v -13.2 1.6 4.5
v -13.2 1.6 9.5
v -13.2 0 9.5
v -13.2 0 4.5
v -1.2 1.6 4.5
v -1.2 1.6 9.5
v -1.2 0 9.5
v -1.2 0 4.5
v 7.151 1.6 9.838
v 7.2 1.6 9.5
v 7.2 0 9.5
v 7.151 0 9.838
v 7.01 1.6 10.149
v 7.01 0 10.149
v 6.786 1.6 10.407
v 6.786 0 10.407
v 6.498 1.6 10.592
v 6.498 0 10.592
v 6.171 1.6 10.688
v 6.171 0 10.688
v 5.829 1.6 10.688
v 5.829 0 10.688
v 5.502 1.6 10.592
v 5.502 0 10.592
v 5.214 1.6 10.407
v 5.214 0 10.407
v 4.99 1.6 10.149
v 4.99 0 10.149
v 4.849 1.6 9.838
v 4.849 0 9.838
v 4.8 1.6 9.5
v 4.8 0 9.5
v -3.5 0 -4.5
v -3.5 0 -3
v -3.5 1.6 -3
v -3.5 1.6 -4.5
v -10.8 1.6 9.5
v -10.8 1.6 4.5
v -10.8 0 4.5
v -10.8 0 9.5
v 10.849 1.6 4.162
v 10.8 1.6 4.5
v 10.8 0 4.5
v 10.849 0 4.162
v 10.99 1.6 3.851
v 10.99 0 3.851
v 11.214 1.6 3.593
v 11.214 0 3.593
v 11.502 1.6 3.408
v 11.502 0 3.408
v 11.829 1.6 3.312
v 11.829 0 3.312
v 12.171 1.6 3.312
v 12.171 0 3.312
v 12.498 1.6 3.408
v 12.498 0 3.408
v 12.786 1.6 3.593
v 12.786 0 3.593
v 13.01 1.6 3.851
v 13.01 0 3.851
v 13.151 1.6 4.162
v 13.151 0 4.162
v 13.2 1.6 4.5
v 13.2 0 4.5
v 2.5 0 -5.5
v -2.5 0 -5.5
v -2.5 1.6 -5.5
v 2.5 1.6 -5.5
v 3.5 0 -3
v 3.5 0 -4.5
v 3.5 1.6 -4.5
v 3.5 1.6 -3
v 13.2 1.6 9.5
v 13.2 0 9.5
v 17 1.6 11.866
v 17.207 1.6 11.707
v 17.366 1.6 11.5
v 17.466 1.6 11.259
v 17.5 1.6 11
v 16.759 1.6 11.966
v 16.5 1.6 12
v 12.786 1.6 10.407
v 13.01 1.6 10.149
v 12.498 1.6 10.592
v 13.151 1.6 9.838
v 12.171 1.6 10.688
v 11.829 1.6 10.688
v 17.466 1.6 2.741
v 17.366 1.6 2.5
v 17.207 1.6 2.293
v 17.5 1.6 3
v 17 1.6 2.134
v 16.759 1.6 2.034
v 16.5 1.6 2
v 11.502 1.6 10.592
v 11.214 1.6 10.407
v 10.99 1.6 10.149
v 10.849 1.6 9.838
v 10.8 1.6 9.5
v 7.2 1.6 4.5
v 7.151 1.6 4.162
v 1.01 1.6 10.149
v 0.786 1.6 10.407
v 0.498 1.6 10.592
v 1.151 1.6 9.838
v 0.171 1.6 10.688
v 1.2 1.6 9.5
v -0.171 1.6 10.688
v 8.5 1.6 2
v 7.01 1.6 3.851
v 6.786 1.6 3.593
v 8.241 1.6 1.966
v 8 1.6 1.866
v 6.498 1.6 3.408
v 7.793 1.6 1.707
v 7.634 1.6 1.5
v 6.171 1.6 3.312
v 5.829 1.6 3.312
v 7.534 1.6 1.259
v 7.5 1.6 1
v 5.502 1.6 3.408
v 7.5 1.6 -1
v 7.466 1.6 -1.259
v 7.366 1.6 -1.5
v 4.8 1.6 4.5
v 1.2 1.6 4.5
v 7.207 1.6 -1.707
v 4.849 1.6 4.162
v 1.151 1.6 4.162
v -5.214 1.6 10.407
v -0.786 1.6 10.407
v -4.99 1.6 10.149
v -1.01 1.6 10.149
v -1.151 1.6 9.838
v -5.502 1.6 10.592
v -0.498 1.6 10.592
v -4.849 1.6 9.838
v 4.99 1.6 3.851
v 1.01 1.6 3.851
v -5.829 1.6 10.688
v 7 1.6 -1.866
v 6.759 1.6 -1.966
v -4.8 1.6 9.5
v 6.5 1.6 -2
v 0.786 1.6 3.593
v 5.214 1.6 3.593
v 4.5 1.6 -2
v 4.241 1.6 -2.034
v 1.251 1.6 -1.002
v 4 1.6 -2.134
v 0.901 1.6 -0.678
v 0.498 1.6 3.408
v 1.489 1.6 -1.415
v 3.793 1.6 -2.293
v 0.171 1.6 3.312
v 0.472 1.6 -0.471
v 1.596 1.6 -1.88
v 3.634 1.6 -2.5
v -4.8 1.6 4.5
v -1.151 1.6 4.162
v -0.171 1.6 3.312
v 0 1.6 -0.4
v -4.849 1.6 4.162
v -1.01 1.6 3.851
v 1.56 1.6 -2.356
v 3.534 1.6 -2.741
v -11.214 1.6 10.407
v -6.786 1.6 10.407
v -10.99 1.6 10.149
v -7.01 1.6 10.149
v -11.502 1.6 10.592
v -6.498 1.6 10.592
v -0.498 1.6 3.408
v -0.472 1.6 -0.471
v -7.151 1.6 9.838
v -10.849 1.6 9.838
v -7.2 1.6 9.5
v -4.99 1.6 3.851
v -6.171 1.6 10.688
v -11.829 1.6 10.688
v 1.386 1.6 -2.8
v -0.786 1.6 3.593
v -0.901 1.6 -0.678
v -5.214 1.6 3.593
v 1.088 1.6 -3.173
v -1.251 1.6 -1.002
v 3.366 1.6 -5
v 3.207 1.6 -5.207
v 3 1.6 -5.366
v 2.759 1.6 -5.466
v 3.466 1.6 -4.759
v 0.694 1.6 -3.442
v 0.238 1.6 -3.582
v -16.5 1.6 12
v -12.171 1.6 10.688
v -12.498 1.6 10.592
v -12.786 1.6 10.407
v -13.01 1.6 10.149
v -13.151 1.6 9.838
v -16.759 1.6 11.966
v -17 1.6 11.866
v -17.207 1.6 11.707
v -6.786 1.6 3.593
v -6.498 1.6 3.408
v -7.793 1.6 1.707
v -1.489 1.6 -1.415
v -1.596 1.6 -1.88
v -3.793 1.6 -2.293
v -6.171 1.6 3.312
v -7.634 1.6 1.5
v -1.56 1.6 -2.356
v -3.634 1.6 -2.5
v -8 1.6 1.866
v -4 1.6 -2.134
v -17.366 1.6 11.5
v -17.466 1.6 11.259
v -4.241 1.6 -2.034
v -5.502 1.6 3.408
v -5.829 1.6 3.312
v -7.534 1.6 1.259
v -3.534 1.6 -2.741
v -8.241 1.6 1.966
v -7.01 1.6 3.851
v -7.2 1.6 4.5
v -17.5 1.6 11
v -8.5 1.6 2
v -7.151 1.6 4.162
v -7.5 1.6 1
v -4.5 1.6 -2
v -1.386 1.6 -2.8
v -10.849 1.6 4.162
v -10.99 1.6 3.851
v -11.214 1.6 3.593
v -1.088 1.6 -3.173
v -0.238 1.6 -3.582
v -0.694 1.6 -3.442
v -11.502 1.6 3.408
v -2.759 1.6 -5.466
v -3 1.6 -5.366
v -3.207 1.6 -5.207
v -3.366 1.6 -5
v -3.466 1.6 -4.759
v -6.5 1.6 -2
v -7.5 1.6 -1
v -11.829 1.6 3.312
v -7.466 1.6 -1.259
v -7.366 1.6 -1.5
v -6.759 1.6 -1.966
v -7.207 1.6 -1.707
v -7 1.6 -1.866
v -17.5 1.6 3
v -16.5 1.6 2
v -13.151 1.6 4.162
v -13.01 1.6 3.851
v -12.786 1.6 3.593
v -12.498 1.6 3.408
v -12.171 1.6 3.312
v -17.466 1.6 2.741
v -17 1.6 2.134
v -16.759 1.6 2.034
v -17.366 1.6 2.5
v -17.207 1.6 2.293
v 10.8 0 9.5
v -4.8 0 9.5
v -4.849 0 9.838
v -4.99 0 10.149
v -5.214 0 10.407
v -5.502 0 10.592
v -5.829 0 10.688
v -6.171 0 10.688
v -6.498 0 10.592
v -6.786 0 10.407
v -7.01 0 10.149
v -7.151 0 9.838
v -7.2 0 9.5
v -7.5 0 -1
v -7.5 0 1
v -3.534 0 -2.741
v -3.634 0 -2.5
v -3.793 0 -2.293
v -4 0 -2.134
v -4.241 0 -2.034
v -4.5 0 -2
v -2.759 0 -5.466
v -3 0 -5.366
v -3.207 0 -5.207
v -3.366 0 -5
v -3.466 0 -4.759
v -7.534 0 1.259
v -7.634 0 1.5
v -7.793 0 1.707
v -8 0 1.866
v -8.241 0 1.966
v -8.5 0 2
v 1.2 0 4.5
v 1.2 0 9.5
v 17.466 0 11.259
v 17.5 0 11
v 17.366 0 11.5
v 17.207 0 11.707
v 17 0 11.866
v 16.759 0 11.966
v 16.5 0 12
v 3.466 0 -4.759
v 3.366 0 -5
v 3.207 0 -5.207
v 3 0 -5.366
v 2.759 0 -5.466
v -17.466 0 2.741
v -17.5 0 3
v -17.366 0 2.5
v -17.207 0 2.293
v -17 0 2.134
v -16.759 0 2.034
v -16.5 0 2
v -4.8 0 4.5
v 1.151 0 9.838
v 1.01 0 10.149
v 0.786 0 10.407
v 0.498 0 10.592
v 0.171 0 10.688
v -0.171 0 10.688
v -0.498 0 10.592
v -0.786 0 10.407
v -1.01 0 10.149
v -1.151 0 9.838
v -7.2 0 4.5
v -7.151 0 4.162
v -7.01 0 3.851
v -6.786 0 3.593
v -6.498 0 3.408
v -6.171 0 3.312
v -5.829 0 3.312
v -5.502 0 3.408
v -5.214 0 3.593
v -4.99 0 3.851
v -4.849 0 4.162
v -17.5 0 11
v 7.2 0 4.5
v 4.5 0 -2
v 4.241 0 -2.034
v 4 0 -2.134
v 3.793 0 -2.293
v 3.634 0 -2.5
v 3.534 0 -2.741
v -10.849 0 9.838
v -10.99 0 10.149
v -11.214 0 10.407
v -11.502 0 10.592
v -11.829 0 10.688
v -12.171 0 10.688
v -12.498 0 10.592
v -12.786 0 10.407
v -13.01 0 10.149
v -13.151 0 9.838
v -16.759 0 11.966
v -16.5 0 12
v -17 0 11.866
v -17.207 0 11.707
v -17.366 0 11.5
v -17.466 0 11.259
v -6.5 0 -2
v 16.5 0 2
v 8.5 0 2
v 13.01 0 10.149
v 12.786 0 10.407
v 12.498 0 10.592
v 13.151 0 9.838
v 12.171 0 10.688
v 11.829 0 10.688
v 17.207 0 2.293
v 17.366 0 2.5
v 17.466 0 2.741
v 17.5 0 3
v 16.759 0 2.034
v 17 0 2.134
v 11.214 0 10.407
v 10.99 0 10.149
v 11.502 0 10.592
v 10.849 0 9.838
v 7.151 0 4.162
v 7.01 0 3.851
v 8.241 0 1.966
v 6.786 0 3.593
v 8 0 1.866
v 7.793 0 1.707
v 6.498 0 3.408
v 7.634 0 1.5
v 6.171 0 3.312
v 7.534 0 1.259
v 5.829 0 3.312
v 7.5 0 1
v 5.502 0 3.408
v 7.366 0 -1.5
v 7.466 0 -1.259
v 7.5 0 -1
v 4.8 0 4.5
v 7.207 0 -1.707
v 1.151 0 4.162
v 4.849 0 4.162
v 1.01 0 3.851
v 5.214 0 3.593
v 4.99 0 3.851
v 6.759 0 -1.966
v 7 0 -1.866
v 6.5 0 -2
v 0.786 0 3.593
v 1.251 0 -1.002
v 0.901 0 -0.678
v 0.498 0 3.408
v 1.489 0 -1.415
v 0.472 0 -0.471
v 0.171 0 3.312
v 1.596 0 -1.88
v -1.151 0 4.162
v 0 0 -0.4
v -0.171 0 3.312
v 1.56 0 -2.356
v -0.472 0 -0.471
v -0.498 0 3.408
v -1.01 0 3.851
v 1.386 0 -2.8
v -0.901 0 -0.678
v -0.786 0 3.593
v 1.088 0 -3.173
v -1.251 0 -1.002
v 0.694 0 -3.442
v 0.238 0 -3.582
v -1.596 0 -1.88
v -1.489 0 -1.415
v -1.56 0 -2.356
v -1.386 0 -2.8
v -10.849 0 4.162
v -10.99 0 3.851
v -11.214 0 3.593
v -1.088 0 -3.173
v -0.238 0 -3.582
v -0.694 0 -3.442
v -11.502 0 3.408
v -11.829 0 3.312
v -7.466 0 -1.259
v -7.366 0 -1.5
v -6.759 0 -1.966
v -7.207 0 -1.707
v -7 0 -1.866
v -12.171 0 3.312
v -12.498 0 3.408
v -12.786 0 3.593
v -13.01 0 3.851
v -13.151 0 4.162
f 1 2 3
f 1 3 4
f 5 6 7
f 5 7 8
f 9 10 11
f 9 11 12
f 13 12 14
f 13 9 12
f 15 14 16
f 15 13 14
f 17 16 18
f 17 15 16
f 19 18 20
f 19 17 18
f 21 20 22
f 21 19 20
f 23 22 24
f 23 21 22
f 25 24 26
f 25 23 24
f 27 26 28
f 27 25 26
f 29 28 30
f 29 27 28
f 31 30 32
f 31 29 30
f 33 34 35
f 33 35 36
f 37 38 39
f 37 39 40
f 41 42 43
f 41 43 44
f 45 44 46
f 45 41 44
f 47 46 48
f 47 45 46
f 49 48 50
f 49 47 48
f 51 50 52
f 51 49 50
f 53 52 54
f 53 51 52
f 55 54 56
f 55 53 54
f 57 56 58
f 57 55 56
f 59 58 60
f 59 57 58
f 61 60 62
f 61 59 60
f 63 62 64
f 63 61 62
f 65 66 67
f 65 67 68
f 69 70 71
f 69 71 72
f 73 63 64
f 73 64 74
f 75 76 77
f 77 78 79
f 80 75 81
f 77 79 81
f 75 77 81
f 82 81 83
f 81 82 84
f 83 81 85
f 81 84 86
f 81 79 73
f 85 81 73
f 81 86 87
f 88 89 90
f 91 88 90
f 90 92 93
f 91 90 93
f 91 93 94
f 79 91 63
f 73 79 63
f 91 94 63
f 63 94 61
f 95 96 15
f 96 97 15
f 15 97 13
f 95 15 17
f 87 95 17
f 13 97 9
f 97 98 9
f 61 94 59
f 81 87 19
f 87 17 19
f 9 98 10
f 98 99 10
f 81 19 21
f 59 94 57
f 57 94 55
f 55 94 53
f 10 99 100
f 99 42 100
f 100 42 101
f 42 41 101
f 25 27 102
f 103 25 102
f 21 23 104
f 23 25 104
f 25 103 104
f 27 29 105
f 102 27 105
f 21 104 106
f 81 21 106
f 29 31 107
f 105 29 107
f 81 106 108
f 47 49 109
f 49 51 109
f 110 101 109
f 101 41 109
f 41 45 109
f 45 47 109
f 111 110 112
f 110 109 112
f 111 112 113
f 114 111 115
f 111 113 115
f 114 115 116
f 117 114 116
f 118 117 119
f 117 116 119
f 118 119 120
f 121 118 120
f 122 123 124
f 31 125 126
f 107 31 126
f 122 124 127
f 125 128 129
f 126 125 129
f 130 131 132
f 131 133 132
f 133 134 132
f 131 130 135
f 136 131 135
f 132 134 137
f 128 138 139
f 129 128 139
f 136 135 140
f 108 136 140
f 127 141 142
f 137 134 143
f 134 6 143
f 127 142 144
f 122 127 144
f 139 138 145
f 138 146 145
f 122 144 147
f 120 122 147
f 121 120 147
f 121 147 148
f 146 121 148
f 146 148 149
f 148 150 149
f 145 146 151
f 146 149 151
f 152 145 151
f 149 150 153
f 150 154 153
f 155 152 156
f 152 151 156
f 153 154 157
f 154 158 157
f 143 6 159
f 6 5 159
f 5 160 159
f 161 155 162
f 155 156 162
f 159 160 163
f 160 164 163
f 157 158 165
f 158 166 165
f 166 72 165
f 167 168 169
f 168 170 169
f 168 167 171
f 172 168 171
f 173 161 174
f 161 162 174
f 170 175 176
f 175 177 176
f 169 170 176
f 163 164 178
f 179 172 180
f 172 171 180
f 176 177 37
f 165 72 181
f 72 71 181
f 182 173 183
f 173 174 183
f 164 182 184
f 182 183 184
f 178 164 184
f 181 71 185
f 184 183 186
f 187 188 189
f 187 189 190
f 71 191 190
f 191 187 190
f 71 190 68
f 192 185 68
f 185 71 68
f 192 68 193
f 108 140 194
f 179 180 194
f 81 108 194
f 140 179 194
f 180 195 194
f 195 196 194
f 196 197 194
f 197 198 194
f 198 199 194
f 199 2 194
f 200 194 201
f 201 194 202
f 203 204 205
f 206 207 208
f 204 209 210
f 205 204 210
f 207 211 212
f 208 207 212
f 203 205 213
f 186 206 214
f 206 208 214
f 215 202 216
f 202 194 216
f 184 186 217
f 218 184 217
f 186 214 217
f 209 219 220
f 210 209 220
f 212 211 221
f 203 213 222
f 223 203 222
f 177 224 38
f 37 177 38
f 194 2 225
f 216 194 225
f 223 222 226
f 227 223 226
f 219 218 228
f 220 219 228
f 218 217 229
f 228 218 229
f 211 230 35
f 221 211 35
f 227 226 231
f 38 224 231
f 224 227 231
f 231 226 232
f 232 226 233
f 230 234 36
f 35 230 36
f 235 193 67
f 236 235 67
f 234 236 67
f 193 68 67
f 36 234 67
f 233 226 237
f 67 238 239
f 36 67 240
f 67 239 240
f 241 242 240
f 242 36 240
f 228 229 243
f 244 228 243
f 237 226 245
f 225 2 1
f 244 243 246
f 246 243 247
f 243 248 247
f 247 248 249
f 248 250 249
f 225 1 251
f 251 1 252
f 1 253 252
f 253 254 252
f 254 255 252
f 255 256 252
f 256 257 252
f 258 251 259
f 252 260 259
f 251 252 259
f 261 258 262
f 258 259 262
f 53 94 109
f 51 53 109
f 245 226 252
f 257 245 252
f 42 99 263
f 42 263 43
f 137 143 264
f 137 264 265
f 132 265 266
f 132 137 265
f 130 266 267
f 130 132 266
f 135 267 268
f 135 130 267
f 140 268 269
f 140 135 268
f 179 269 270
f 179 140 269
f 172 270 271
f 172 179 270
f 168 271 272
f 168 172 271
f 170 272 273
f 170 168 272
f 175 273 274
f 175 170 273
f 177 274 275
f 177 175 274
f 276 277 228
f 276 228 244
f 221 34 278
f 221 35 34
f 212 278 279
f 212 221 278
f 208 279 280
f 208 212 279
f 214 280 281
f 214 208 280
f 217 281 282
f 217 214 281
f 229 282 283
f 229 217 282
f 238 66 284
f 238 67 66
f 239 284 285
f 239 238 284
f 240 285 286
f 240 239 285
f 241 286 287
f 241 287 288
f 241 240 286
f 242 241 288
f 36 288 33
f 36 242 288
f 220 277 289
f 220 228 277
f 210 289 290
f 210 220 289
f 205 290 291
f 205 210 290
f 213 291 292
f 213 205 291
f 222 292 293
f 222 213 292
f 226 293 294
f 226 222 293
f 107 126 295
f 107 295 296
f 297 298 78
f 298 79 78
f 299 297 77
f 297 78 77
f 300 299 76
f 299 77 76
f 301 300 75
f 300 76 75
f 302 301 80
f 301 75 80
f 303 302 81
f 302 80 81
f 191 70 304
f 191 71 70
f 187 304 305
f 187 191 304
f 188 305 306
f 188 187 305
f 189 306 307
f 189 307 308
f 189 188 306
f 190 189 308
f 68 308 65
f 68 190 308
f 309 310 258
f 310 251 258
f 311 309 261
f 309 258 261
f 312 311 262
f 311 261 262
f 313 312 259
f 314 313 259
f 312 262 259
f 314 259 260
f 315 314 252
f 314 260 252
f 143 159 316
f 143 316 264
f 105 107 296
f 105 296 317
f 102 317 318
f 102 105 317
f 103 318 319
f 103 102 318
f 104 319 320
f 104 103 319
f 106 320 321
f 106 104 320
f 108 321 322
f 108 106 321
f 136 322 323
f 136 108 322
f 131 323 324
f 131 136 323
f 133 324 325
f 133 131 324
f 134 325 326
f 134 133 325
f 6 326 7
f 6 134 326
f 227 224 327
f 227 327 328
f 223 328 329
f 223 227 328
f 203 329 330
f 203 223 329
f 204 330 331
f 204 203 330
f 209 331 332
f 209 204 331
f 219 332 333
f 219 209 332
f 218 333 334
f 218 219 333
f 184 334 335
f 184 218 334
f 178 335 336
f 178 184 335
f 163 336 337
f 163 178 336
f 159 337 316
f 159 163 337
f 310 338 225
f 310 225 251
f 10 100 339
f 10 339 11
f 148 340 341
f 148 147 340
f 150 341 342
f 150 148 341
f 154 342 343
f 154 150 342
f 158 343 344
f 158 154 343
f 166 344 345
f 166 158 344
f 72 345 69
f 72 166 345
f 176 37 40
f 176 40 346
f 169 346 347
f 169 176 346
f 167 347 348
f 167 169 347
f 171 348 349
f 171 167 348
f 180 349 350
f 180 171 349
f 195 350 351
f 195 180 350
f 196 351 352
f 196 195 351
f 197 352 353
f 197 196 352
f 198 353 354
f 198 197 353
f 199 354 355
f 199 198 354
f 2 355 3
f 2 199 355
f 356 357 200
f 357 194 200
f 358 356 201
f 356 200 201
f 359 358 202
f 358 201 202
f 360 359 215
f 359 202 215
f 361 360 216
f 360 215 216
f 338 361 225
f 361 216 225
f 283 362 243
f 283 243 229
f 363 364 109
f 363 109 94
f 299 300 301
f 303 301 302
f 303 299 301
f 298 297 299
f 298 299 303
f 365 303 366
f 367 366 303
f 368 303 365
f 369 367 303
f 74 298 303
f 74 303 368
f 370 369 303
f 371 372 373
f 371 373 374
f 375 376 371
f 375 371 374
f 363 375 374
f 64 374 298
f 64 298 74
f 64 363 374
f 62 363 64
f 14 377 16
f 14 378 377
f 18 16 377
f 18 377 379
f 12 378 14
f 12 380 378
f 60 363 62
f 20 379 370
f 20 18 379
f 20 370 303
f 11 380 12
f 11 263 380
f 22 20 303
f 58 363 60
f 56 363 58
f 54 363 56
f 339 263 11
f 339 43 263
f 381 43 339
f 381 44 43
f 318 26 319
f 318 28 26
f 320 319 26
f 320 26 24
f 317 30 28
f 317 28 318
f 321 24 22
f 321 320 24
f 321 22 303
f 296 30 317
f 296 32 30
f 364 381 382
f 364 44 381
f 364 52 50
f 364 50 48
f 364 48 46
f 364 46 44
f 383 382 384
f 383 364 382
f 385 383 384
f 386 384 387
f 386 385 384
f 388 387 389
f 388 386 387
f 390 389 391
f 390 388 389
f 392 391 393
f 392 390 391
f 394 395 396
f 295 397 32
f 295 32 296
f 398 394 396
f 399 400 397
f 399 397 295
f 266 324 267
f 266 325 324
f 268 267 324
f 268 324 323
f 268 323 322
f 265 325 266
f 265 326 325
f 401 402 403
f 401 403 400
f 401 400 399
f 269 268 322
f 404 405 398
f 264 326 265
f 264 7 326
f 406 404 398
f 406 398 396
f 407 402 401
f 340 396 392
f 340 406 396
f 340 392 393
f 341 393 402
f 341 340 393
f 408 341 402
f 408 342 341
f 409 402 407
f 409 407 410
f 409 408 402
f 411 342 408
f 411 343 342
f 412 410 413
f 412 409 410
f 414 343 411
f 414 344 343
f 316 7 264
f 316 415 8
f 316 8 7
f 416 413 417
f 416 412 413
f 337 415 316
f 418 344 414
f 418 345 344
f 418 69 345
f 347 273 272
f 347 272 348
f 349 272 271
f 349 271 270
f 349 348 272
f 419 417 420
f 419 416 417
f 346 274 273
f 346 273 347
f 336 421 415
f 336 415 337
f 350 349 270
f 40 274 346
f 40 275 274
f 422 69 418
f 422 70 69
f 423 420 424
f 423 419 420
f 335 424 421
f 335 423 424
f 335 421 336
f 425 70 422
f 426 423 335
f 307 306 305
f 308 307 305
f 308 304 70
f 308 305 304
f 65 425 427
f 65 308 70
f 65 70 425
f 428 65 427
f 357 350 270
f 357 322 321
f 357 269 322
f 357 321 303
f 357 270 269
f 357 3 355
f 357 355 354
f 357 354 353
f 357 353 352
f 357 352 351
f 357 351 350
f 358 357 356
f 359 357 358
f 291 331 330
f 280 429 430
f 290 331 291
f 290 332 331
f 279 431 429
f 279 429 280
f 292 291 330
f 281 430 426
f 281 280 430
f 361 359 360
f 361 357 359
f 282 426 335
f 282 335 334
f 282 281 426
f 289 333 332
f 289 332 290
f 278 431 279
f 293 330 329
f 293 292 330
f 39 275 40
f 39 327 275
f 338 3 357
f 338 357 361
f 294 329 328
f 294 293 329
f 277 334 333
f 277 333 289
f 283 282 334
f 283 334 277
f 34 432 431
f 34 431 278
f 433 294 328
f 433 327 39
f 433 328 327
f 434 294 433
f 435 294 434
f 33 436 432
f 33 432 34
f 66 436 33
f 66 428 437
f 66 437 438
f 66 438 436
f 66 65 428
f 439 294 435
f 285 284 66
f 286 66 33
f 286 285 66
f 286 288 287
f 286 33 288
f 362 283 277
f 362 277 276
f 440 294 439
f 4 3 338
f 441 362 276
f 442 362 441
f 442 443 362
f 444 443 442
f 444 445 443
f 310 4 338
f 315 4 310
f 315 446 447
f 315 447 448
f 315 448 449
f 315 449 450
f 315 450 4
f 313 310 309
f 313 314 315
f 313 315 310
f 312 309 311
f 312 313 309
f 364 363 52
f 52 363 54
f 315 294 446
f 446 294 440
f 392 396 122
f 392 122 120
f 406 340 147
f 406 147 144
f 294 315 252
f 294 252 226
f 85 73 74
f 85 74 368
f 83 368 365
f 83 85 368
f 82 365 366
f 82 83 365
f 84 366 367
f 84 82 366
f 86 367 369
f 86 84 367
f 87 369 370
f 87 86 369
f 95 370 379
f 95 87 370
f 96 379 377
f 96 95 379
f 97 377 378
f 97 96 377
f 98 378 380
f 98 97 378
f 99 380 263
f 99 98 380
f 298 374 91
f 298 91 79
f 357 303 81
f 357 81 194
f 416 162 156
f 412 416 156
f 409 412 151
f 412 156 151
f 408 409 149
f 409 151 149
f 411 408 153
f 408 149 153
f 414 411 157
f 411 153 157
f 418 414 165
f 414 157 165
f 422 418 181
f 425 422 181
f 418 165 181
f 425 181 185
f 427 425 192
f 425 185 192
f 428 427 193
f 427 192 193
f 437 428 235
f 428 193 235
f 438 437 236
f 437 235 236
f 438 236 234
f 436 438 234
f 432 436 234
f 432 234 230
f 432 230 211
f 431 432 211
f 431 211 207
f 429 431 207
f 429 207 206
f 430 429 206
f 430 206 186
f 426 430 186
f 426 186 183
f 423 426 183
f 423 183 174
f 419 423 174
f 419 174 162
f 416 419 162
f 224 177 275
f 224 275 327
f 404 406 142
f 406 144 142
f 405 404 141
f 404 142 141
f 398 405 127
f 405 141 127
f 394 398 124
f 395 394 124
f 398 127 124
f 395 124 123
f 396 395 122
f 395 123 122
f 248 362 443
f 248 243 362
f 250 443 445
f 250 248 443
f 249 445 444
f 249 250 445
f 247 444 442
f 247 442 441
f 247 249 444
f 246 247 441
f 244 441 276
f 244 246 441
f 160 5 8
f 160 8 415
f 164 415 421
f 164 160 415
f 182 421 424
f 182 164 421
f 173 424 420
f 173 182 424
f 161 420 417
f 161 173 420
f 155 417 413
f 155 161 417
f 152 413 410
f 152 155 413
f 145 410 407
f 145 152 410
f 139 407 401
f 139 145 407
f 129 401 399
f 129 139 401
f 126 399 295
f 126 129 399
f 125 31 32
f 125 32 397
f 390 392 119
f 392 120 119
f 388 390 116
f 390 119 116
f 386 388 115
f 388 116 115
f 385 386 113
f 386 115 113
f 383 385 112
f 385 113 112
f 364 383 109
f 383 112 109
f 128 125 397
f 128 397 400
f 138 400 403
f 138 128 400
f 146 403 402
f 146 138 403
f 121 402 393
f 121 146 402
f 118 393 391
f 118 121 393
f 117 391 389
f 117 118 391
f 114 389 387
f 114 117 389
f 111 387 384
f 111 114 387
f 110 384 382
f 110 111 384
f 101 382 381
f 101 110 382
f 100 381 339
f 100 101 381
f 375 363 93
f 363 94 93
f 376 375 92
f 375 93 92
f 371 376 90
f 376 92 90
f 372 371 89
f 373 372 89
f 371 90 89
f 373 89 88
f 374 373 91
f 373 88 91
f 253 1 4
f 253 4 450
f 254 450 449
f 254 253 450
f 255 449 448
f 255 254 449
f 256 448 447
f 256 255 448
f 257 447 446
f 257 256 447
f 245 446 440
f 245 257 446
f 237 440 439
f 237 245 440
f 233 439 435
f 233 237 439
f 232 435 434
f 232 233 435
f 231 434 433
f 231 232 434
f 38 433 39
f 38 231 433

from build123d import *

# Parameters (mm, degrees)
BOSS_EXTRUDE1_DEPTH = 1.6
SKETCH2_R           = 1.6
CUT_EXTRUDE1_DEPTH  = 22.279332696
FILLET1_R           = 1
CUT_EXTRUDE2_DEPTH  = 22.279332696
LPATTERN1_COUNT     = 3
LPATTERN1_PITCH     = 6
LPATTERN1_COL_COUNT = 3
LPATTERN1_COL_PITCH = 6


with BuildPart() as part:
    # Sketch1 → Boss-Extrude1 (new body)
    with BuildSketch(Plane(origin=(0, 0, 0), x_dir=(1, 0, 0), z_dir=(0, 1, 0))):
        Polygon((3.5, 2), (7.5, 2), (7.5, -2), (17.5, -2), (17.5, -12), (-17.5, -12), (-17.5, -2), (-7.5, -2), (-7.5, 2), (-3.5, 2), (-3.5, 5.5), (3.5, 5.5), align=None)
    extrude(amount=BOSS_EXTRUDE1_DEPTH)

    # Sketch2 → Cut-Extrude1 (cut, through all)
    with BuildSketch(Plane(origin=(0, 1.6, 0), x_dir=(1, 0, 0), z_dir=(0, 1, 0))):
        with Locations(Location((0, 2, 0), (0, 0, 270))):
            Circle(SKETCH2_R)
    extrude(amount=-CUT_EXTRUDE1_DEPTH, mode=Mode.SUBTRACT)

    # Fillet1
    fillet1_edges = [part.edges().sort_by_distance(p)[0] for p in [
        (7.5, 0.8, 2),
        (17.5, 0.8, 2),
        (17.5, 0.8, 12),
        (-17.5, 0.8, 12),
        (-17.5, 0.8, 2),
        (-7.5, 0.8, 2),
        (-7.5, 0.8, -2),
        (-3.5, 0.8, -2),
        (-3.5, 0.8, -5.5),
        (3.5, 0.8, -5.5),
        (3.5, 0.8, -2),
        (7.5, 0.8, -2),
    ]]
    fillet(fillet1_edges, radius=FILLET1_R)

    # Sketch3 → Cut-Extrude2 (cut, through all)
    with BuildSketch(Plane(origin=(0, 1.6, 0), x_dir=(1, 0, 0), z_dir=(0, 1, 0))):
        with BuildLine():
            Line((-1.2, -9.5), (-1.2, -4.5))
            ThreePointArc((-1.2, -4.5), (0, -3.3), (1.2, -4.5))
            Line((1.2, -4.5), (1.2, -9.5))
            ThreePointArc((1.2, -9.5), (0, -10.7), (-1.2, -9.5))
        make_face()
    cut_extrude2 = extrude(amount=-CUT_EXTRUDE2_DEPTH, mode=Mode.SUBTRACT)

    # LPattern1: Cut-Extrude2 ×3
    with Locations(*[(i * LPATTERN1_PITCH, 0, 0) for i in range(1, LPATTERN1_COUNT)]):
        add(cut_extrude2, mode=Mode.SUBTRACT)

    # LPattern1 col: Cut-Extrude2 ×3
    with Locations(*[(-i * LPATTERN1_COL_PITCH, 0, 0) for i in range(1, LPATTERN1_COL_COUNT)]):
        add(cut_extrude2, mode=Mode.SUBTRACT)


solid = part.part
